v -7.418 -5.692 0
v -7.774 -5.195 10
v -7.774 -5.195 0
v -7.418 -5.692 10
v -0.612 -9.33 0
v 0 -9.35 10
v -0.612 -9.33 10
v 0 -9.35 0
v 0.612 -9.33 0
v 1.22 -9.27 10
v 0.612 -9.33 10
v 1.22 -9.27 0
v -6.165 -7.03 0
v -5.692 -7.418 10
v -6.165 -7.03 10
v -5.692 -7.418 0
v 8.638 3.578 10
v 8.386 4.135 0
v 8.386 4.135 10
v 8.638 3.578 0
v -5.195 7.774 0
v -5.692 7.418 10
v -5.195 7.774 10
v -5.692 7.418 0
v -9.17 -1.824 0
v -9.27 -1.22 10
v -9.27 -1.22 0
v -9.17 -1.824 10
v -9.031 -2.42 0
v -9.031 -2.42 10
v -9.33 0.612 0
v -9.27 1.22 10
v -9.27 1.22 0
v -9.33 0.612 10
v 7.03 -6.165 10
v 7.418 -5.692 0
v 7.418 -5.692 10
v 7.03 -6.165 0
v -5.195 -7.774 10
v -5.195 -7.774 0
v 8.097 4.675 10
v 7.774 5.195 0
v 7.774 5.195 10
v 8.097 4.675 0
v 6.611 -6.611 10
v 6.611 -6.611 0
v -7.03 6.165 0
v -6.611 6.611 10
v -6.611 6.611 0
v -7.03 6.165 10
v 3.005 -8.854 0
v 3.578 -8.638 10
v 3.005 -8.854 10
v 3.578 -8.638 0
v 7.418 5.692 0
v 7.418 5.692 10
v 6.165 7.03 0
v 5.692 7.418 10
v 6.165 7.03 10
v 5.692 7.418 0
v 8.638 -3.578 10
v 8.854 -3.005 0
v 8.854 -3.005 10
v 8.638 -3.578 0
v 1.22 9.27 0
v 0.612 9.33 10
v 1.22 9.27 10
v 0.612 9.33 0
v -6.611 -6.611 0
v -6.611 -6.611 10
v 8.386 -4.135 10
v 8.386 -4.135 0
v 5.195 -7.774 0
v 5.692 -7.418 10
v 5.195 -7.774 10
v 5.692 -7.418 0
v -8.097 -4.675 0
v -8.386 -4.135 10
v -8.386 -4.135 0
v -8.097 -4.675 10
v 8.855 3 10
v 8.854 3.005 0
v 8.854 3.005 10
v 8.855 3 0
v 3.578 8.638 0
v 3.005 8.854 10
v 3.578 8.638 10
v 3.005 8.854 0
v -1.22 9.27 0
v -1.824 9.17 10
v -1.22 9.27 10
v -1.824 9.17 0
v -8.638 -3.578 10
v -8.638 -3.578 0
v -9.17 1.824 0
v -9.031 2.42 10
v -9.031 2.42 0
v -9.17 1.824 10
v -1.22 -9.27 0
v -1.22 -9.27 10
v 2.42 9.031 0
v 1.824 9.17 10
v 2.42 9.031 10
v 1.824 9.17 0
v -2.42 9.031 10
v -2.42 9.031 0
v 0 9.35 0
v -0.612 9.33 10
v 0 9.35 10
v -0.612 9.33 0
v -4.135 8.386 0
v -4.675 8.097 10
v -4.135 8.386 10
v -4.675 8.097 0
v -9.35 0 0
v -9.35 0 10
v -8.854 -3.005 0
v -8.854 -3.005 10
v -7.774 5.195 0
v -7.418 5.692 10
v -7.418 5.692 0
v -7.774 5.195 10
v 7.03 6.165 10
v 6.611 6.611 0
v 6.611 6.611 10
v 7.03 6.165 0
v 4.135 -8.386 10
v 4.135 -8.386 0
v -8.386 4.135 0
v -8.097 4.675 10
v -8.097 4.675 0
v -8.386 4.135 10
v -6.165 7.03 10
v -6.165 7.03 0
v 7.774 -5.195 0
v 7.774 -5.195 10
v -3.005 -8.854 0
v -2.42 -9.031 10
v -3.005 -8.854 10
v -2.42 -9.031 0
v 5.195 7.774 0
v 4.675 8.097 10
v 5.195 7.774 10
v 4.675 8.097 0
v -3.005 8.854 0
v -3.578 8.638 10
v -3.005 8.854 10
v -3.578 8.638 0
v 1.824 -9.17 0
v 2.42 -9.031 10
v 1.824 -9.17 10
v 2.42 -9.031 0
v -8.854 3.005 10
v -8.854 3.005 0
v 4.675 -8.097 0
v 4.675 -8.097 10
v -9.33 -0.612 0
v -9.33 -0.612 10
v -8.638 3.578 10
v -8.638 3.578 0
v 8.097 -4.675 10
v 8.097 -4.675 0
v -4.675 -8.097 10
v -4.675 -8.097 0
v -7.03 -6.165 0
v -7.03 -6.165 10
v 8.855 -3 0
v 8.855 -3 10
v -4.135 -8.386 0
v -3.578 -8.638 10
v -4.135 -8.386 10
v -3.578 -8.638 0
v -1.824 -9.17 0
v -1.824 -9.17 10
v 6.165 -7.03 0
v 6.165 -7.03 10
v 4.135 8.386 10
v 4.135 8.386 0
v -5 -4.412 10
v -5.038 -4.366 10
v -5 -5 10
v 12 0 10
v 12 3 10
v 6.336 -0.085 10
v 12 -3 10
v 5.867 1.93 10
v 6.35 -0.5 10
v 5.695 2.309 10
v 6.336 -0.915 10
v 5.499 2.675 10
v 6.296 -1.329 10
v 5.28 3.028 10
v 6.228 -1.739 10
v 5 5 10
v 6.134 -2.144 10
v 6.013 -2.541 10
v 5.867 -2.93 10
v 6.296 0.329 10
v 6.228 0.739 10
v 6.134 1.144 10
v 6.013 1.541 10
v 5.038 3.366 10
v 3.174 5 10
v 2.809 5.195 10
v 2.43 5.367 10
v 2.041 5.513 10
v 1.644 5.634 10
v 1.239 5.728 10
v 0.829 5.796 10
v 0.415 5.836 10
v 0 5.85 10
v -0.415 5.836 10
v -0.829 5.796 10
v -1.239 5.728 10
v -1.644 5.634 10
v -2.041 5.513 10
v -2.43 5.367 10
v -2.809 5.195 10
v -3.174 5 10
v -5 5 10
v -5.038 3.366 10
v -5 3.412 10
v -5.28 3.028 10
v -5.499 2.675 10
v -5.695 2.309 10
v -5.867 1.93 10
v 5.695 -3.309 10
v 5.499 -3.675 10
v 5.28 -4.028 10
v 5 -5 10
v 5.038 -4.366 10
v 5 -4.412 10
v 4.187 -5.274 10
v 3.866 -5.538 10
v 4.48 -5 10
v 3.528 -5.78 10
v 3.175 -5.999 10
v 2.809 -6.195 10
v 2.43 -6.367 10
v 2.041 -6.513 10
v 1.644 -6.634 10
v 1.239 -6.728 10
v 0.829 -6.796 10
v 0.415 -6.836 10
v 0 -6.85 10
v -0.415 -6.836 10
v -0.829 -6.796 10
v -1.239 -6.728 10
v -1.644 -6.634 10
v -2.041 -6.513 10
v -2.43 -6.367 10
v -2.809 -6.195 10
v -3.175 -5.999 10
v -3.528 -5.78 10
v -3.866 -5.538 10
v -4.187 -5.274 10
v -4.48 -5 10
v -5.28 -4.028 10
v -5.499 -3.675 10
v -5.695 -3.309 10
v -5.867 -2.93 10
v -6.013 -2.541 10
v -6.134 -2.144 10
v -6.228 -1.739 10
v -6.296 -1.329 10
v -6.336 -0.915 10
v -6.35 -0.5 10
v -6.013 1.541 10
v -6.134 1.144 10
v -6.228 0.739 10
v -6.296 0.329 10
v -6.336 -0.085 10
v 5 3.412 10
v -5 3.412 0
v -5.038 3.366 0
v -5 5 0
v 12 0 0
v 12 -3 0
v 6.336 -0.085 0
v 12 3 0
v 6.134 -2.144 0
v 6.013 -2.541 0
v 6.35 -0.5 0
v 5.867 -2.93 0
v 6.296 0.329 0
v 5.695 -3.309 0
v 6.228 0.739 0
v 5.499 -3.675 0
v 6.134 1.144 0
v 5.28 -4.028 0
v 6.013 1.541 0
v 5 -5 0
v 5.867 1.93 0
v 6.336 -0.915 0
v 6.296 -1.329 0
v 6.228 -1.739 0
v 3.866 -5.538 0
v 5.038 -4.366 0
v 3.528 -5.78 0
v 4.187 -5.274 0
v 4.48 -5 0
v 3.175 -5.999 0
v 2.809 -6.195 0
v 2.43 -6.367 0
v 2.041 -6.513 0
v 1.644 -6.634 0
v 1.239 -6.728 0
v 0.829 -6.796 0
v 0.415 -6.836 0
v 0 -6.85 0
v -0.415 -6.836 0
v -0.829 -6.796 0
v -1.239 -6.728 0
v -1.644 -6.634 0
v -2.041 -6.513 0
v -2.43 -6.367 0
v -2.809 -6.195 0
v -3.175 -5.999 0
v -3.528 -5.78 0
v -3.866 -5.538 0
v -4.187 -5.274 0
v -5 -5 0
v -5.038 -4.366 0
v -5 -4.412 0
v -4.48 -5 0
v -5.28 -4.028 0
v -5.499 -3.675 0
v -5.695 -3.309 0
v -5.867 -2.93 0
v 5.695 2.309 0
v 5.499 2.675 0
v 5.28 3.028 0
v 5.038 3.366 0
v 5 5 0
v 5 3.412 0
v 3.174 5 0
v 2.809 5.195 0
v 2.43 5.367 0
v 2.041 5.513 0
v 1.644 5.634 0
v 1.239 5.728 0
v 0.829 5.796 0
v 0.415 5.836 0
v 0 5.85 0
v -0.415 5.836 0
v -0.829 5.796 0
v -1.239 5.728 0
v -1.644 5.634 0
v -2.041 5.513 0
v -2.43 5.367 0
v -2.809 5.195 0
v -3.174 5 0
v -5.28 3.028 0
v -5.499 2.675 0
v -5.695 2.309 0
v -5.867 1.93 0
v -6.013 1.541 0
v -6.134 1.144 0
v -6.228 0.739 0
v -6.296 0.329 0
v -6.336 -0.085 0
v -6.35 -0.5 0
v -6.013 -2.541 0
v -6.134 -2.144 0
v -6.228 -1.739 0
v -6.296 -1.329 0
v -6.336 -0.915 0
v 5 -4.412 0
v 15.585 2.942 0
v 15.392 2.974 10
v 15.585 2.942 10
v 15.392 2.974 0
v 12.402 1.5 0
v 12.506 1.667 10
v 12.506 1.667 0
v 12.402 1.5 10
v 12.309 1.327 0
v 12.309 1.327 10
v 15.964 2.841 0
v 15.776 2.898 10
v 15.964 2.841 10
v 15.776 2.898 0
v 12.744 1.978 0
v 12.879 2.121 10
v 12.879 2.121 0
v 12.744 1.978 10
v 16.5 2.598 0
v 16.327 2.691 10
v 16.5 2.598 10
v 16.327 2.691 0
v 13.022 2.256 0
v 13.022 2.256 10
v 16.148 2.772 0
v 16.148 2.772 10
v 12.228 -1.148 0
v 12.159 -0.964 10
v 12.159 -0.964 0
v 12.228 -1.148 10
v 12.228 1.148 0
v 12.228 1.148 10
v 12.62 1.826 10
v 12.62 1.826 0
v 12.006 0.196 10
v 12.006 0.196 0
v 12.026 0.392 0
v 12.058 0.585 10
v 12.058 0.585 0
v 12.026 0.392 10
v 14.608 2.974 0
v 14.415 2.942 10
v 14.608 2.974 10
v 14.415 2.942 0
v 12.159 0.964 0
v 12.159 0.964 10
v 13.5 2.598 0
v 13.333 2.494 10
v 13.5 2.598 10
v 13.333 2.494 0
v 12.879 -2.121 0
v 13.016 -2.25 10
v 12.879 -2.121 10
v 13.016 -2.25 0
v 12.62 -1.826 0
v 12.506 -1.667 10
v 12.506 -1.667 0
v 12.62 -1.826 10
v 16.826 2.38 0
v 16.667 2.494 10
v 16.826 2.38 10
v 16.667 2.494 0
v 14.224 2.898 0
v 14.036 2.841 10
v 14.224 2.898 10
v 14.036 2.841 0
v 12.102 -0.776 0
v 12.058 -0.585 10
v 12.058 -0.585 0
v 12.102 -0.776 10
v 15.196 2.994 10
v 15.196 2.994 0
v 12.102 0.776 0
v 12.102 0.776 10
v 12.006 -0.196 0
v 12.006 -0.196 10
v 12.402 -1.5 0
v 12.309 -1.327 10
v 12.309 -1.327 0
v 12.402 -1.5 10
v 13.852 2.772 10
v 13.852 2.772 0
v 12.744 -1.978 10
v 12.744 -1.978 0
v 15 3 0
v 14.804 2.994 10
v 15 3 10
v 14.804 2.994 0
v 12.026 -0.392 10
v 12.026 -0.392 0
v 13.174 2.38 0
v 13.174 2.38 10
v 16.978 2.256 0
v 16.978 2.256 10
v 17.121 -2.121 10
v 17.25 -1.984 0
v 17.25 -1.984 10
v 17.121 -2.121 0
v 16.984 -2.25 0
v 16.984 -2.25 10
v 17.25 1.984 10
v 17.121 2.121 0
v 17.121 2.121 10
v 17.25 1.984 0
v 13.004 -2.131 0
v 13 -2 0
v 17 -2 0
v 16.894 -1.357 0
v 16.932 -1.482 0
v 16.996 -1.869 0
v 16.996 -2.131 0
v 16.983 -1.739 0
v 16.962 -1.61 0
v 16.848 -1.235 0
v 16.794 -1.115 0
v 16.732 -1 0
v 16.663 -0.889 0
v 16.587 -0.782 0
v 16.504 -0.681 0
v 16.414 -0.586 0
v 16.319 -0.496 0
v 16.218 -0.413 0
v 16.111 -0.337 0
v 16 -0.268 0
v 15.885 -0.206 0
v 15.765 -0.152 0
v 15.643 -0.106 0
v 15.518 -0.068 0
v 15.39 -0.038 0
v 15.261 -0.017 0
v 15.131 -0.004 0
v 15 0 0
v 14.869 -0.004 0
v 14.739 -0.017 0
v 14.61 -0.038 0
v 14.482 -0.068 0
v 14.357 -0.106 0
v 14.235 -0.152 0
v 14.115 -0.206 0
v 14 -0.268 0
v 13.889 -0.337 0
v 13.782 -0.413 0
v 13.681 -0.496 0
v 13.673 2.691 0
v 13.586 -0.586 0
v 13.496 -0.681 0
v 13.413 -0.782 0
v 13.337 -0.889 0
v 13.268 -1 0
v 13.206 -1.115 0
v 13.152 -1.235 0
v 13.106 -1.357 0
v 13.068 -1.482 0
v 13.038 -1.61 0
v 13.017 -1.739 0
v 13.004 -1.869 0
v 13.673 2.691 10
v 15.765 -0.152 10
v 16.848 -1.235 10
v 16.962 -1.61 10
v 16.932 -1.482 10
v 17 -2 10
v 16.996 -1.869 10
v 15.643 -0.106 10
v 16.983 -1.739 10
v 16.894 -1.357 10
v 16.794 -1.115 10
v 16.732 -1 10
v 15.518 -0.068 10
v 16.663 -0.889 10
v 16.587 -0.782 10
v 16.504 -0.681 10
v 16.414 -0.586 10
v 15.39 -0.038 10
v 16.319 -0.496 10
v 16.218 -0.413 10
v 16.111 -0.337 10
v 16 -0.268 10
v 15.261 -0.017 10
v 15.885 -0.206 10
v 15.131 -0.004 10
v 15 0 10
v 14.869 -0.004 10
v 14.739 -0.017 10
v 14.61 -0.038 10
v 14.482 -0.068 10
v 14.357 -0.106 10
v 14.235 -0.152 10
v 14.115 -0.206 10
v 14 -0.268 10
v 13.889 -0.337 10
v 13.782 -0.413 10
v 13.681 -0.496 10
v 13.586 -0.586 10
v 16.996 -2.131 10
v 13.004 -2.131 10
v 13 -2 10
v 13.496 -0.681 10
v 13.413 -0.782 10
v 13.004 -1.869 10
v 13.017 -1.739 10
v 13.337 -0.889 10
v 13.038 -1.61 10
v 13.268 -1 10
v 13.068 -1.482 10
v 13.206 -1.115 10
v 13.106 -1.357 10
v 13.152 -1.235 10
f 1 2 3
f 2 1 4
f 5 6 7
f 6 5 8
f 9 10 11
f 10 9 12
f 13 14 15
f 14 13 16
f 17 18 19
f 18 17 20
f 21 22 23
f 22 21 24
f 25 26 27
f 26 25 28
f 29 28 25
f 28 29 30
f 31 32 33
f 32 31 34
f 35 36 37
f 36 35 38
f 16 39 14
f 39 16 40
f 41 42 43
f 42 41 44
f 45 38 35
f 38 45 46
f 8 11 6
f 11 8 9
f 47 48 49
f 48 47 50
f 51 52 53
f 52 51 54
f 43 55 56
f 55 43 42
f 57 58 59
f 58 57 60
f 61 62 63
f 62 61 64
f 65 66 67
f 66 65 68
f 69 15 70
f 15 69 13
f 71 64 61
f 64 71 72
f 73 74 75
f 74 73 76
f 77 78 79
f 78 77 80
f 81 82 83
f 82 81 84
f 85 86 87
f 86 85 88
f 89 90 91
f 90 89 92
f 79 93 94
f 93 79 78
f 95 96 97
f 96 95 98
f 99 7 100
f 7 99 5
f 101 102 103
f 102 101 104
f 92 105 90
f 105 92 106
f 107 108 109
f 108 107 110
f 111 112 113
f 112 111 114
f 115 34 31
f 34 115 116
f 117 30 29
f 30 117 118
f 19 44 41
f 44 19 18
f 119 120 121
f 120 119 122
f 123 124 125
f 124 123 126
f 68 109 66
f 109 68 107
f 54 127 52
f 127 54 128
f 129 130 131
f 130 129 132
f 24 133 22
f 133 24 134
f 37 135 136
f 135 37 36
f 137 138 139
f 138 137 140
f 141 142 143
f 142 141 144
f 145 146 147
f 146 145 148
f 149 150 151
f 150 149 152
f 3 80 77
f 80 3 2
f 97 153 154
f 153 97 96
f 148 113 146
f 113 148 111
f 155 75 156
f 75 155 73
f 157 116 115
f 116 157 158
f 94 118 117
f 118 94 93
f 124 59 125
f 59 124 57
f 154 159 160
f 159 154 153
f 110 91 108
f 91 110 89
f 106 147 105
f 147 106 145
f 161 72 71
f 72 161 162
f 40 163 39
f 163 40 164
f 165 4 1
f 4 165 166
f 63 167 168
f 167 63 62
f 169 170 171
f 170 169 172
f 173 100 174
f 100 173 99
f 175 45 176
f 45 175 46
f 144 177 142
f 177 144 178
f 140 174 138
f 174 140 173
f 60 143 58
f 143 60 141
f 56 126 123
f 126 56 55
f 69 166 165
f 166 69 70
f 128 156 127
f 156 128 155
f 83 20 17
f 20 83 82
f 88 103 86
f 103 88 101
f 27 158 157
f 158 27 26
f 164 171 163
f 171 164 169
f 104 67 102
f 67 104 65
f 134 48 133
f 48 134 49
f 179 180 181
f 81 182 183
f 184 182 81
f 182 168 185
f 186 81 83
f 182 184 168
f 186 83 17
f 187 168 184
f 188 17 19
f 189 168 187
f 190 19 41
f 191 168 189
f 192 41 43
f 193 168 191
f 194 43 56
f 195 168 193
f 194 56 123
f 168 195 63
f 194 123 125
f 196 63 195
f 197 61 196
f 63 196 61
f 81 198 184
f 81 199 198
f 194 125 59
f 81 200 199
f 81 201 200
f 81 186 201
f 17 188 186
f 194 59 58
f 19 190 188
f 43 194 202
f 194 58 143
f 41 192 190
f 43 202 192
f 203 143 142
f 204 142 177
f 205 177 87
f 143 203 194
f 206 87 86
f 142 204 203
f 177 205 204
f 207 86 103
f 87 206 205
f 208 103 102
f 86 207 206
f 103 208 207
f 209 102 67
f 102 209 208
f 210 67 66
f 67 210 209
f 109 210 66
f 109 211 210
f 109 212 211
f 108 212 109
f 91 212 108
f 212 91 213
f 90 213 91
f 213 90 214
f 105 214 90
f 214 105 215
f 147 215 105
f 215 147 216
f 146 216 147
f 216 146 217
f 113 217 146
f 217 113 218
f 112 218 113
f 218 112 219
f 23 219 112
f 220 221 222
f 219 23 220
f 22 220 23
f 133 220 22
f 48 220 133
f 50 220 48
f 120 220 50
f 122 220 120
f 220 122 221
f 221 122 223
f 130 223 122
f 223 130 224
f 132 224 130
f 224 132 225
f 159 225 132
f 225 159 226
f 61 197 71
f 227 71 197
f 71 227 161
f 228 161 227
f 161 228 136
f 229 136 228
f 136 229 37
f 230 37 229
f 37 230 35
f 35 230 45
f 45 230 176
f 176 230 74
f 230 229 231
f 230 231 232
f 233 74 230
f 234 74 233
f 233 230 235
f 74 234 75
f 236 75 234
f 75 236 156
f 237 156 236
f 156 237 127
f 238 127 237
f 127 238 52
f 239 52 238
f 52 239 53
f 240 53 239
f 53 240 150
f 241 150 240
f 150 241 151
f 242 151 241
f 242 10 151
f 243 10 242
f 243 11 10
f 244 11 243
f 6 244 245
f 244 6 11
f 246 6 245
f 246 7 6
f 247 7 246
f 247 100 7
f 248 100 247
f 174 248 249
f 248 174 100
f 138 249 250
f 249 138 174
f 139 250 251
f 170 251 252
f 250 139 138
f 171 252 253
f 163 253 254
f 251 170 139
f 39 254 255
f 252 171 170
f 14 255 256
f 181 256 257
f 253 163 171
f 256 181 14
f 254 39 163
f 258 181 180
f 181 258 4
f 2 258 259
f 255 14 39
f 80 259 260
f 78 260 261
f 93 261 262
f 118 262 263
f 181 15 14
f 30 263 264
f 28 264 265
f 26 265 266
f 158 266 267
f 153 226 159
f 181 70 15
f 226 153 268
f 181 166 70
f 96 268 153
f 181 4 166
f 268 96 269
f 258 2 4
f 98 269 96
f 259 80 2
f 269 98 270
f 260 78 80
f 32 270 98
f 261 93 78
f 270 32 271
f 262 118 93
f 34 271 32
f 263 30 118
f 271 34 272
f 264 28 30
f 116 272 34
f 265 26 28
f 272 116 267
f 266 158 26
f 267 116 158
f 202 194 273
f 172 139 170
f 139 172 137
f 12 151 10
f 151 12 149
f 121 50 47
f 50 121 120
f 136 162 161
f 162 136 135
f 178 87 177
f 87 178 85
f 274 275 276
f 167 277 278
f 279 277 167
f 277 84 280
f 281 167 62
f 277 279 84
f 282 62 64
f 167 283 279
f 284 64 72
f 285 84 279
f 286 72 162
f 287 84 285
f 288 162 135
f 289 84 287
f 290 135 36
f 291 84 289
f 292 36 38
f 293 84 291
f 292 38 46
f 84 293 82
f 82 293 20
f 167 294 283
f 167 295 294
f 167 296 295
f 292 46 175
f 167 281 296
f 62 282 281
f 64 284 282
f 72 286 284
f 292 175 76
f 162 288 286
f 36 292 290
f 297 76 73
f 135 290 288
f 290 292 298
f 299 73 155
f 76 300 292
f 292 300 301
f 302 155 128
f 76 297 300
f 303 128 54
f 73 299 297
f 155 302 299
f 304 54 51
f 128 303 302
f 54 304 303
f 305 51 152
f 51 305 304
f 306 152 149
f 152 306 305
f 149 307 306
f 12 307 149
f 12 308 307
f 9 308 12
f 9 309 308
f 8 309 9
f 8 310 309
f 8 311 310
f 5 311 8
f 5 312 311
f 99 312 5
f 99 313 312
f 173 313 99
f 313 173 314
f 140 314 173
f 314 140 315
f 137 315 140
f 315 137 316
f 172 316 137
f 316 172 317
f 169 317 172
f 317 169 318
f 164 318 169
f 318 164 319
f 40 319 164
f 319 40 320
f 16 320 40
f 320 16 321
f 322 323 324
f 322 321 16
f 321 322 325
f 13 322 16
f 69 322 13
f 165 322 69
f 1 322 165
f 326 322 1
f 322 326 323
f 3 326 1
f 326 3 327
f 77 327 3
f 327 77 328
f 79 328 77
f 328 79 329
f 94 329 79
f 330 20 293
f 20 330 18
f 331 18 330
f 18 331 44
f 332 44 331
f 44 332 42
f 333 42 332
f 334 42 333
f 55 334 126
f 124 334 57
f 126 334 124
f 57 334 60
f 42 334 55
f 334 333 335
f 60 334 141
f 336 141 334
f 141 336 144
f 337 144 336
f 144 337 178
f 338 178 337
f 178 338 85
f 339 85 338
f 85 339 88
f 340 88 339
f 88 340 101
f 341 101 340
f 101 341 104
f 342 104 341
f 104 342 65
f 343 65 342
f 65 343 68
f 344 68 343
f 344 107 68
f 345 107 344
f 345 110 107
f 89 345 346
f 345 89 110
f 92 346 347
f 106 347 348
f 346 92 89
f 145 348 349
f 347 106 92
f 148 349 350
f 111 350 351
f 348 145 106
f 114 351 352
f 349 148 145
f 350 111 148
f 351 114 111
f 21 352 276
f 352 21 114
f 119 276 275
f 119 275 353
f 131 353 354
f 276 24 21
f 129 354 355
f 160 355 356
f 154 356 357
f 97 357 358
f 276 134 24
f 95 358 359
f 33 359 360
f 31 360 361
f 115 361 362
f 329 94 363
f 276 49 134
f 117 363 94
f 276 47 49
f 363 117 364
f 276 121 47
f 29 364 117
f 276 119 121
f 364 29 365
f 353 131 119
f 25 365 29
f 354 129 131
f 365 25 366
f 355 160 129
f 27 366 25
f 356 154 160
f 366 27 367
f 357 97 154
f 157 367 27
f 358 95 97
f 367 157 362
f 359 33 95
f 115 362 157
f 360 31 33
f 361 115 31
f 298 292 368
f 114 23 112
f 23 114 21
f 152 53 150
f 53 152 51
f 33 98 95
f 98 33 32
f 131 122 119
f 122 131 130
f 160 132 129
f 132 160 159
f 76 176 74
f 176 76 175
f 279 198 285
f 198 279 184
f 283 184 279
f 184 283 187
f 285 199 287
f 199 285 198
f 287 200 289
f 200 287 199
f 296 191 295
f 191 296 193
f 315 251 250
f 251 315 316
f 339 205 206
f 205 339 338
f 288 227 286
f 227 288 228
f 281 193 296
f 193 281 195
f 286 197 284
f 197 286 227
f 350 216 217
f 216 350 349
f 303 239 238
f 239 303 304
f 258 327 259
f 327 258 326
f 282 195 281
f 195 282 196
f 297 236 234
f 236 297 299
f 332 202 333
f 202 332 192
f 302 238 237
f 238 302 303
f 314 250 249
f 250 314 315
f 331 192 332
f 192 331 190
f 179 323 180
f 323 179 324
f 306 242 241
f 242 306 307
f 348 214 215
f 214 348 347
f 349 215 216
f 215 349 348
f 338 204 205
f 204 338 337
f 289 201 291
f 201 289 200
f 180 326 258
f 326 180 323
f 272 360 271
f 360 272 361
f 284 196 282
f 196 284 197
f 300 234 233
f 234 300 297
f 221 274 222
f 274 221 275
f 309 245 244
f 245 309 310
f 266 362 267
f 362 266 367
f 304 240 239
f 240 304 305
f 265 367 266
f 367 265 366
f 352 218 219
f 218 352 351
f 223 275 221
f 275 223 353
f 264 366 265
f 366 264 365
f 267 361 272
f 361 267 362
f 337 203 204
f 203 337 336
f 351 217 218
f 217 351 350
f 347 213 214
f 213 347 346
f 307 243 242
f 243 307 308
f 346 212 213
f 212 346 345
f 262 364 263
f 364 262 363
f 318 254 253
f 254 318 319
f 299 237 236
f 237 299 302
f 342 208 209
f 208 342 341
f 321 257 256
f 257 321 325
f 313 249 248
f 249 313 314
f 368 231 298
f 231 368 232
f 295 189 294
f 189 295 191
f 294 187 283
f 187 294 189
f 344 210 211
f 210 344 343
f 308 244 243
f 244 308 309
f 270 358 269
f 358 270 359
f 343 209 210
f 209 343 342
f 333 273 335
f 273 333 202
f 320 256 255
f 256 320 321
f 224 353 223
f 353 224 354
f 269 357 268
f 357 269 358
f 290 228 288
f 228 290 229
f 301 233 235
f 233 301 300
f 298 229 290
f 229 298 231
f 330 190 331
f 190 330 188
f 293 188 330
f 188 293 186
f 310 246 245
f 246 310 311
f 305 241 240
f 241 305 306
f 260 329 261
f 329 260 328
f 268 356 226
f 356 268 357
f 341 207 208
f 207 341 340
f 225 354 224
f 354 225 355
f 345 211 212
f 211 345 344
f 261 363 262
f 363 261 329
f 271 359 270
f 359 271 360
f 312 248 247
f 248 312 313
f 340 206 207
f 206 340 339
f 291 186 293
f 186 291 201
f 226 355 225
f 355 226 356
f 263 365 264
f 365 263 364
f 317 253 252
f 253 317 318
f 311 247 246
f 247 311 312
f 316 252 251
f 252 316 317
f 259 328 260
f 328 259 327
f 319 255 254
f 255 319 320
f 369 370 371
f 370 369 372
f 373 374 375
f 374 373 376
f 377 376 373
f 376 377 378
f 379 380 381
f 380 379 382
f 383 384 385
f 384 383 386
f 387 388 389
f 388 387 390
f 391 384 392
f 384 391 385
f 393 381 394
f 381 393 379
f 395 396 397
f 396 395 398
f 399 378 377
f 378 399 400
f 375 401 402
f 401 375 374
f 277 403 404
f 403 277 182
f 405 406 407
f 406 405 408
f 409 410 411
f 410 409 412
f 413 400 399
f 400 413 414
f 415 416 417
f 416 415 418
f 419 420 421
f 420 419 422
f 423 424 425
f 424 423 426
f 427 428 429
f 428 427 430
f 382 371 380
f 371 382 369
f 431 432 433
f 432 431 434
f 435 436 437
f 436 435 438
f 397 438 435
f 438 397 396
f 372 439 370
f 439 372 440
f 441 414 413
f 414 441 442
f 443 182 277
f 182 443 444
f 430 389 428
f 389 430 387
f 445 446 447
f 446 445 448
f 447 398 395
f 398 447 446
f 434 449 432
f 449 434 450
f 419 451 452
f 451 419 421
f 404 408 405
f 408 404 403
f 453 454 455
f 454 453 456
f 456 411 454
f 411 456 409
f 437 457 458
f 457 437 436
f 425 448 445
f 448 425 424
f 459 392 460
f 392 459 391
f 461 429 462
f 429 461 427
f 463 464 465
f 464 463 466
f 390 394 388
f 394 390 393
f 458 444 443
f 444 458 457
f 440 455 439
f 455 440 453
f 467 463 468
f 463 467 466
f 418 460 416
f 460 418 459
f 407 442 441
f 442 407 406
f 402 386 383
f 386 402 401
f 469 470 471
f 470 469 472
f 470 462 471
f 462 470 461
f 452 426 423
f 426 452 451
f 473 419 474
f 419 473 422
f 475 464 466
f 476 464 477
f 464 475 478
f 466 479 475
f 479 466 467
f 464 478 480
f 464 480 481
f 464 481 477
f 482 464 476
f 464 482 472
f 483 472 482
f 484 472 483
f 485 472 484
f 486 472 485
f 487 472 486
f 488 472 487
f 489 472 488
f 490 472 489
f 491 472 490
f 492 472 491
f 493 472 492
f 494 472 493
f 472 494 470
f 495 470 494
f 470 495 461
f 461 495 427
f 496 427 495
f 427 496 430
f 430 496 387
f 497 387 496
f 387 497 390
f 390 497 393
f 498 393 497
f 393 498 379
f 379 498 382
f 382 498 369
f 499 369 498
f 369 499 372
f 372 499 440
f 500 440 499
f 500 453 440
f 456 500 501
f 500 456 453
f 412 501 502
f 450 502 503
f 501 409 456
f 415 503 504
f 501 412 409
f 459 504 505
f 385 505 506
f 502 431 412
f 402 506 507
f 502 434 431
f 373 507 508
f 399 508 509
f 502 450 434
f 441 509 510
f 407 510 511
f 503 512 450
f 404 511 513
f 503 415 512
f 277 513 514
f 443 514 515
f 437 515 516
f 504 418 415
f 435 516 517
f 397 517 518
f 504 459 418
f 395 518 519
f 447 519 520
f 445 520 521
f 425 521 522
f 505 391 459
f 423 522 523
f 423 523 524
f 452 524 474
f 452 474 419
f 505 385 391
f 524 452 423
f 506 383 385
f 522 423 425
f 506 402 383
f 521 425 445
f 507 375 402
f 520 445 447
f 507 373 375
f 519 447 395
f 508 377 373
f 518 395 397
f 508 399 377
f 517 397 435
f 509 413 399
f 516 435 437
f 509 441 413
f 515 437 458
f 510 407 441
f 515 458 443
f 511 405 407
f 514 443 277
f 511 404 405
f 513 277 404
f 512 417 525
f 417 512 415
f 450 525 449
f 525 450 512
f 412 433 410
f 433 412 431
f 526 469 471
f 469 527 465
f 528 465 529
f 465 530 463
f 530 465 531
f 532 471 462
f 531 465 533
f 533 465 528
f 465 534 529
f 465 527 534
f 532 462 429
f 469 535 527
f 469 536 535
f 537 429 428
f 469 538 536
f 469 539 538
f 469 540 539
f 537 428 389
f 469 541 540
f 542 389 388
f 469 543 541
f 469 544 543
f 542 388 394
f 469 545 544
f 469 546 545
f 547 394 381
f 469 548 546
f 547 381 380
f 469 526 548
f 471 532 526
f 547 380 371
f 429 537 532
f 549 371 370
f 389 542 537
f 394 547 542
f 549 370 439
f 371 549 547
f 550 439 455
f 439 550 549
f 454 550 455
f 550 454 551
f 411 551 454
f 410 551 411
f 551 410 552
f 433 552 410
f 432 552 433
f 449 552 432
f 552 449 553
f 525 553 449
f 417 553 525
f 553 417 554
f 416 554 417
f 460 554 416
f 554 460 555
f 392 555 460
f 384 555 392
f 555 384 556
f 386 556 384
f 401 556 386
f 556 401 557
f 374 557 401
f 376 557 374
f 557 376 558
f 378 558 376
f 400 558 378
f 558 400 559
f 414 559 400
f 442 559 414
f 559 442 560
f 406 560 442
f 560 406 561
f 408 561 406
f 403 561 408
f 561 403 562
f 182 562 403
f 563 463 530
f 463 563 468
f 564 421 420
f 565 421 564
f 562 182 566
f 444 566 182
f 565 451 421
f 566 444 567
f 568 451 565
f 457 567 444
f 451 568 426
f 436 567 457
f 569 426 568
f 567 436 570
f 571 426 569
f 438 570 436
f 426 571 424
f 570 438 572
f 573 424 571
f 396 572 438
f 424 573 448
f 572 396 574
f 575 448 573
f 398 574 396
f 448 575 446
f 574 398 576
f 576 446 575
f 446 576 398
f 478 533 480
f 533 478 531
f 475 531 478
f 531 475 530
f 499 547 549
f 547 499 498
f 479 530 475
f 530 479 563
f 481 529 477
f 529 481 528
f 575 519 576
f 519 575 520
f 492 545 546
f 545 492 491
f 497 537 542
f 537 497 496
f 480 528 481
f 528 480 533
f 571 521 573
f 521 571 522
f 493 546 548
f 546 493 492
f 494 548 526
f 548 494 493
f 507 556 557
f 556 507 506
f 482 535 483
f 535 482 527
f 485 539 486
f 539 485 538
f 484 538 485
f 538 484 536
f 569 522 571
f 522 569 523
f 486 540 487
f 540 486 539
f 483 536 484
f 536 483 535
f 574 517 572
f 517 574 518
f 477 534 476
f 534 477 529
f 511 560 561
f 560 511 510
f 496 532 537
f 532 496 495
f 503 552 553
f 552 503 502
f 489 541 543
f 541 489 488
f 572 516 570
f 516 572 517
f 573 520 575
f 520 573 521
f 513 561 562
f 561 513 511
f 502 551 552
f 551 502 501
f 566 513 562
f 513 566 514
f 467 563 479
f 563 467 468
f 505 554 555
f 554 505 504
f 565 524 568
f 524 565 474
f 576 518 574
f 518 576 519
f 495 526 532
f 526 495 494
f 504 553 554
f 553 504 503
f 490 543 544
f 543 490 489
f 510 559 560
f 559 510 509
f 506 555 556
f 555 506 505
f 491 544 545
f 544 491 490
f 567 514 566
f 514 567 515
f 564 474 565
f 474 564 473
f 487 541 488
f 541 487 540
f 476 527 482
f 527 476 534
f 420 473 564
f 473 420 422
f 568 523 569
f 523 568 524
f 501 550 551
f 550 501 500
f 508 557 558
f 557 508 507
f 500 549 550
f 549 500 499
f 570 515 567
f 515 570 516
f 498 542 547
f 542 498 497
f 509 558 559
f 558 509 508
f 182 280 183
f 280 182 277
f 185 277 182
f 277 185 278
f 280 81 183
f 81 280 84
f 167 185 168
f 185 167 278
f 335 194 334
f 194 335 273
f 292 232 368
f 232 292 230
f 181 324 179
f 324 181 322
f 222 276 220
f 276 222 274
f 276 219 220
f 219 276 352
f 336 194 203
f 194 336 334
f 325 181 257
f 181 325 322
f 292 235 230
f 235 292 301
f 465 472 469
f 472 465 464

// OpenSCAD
// Tubing clip for a 12.7 mm lab stand rod
// Print orientation: flat on the bed, extruded upward in +Z

$fn = 96;

// ---- Dimensions (mm) ----
ring_od      = 18.7;   // rod ring outer diameter
ring_id      = 12.7;   // rod ring inner diameter (rod bore)
ring_wall    = 3;      // rod ring wall thickness
ring_open    = 10;     // rod ring opening width (along -X)

tube_od      = 6;      // tubing ring outer diameter
tube_id      = 4;      // tubing ring inner diameter (6 mm tube + 2 mm wall)
tube_wall    = 2;      // tubing ring wall thickness
tube_open    = 4.5;    // tubing opening width (along +X)

bridge_x0    = 8;      // bridge start (X)
bridge_x1    = 12;     // bridge end (X)
bridge_w     = 6;      // bridge width (Y)

eps          = 0.5;    // cutter overshoot past faces
standoff     = 0.5;    // rod ring centre offset from origin (Y)

// ---- Model ----
difference() {
    union() {
        // Rod ring
        difference() {
            cylinder(d = ring_od, h = 10);
            translate([0, -standoff, 0])
                cylinder(d = ring_id, h = 10);
        }
        // Tubing ring
        translate([15, 0, 0])
            difference() {
                cylinder(d = tube_od, h = 10);
                translate([0, -tube_wall, 0])
                    cylinder(d = tube_id, h = 10);
            }
        // Bridge
        translate([bridge_x0, -bridge_w / 2, 0])
            cube([bridge_x1 - bridge_x0, bridge_w, 10]);
    }
    // Rod ring opening (-X side)
    translate([-ring_open / 2, -ring_open / 2, -eps])
        cube([ring_open, ring_open, 10 + 2 * eps]);
    // Tubing opening (+X side)
    translate([15 + tube_open / 2, -tube_open / 2, -eps])
        cube([tube_open, tube_open, 10 + 2 * eps]);
}
